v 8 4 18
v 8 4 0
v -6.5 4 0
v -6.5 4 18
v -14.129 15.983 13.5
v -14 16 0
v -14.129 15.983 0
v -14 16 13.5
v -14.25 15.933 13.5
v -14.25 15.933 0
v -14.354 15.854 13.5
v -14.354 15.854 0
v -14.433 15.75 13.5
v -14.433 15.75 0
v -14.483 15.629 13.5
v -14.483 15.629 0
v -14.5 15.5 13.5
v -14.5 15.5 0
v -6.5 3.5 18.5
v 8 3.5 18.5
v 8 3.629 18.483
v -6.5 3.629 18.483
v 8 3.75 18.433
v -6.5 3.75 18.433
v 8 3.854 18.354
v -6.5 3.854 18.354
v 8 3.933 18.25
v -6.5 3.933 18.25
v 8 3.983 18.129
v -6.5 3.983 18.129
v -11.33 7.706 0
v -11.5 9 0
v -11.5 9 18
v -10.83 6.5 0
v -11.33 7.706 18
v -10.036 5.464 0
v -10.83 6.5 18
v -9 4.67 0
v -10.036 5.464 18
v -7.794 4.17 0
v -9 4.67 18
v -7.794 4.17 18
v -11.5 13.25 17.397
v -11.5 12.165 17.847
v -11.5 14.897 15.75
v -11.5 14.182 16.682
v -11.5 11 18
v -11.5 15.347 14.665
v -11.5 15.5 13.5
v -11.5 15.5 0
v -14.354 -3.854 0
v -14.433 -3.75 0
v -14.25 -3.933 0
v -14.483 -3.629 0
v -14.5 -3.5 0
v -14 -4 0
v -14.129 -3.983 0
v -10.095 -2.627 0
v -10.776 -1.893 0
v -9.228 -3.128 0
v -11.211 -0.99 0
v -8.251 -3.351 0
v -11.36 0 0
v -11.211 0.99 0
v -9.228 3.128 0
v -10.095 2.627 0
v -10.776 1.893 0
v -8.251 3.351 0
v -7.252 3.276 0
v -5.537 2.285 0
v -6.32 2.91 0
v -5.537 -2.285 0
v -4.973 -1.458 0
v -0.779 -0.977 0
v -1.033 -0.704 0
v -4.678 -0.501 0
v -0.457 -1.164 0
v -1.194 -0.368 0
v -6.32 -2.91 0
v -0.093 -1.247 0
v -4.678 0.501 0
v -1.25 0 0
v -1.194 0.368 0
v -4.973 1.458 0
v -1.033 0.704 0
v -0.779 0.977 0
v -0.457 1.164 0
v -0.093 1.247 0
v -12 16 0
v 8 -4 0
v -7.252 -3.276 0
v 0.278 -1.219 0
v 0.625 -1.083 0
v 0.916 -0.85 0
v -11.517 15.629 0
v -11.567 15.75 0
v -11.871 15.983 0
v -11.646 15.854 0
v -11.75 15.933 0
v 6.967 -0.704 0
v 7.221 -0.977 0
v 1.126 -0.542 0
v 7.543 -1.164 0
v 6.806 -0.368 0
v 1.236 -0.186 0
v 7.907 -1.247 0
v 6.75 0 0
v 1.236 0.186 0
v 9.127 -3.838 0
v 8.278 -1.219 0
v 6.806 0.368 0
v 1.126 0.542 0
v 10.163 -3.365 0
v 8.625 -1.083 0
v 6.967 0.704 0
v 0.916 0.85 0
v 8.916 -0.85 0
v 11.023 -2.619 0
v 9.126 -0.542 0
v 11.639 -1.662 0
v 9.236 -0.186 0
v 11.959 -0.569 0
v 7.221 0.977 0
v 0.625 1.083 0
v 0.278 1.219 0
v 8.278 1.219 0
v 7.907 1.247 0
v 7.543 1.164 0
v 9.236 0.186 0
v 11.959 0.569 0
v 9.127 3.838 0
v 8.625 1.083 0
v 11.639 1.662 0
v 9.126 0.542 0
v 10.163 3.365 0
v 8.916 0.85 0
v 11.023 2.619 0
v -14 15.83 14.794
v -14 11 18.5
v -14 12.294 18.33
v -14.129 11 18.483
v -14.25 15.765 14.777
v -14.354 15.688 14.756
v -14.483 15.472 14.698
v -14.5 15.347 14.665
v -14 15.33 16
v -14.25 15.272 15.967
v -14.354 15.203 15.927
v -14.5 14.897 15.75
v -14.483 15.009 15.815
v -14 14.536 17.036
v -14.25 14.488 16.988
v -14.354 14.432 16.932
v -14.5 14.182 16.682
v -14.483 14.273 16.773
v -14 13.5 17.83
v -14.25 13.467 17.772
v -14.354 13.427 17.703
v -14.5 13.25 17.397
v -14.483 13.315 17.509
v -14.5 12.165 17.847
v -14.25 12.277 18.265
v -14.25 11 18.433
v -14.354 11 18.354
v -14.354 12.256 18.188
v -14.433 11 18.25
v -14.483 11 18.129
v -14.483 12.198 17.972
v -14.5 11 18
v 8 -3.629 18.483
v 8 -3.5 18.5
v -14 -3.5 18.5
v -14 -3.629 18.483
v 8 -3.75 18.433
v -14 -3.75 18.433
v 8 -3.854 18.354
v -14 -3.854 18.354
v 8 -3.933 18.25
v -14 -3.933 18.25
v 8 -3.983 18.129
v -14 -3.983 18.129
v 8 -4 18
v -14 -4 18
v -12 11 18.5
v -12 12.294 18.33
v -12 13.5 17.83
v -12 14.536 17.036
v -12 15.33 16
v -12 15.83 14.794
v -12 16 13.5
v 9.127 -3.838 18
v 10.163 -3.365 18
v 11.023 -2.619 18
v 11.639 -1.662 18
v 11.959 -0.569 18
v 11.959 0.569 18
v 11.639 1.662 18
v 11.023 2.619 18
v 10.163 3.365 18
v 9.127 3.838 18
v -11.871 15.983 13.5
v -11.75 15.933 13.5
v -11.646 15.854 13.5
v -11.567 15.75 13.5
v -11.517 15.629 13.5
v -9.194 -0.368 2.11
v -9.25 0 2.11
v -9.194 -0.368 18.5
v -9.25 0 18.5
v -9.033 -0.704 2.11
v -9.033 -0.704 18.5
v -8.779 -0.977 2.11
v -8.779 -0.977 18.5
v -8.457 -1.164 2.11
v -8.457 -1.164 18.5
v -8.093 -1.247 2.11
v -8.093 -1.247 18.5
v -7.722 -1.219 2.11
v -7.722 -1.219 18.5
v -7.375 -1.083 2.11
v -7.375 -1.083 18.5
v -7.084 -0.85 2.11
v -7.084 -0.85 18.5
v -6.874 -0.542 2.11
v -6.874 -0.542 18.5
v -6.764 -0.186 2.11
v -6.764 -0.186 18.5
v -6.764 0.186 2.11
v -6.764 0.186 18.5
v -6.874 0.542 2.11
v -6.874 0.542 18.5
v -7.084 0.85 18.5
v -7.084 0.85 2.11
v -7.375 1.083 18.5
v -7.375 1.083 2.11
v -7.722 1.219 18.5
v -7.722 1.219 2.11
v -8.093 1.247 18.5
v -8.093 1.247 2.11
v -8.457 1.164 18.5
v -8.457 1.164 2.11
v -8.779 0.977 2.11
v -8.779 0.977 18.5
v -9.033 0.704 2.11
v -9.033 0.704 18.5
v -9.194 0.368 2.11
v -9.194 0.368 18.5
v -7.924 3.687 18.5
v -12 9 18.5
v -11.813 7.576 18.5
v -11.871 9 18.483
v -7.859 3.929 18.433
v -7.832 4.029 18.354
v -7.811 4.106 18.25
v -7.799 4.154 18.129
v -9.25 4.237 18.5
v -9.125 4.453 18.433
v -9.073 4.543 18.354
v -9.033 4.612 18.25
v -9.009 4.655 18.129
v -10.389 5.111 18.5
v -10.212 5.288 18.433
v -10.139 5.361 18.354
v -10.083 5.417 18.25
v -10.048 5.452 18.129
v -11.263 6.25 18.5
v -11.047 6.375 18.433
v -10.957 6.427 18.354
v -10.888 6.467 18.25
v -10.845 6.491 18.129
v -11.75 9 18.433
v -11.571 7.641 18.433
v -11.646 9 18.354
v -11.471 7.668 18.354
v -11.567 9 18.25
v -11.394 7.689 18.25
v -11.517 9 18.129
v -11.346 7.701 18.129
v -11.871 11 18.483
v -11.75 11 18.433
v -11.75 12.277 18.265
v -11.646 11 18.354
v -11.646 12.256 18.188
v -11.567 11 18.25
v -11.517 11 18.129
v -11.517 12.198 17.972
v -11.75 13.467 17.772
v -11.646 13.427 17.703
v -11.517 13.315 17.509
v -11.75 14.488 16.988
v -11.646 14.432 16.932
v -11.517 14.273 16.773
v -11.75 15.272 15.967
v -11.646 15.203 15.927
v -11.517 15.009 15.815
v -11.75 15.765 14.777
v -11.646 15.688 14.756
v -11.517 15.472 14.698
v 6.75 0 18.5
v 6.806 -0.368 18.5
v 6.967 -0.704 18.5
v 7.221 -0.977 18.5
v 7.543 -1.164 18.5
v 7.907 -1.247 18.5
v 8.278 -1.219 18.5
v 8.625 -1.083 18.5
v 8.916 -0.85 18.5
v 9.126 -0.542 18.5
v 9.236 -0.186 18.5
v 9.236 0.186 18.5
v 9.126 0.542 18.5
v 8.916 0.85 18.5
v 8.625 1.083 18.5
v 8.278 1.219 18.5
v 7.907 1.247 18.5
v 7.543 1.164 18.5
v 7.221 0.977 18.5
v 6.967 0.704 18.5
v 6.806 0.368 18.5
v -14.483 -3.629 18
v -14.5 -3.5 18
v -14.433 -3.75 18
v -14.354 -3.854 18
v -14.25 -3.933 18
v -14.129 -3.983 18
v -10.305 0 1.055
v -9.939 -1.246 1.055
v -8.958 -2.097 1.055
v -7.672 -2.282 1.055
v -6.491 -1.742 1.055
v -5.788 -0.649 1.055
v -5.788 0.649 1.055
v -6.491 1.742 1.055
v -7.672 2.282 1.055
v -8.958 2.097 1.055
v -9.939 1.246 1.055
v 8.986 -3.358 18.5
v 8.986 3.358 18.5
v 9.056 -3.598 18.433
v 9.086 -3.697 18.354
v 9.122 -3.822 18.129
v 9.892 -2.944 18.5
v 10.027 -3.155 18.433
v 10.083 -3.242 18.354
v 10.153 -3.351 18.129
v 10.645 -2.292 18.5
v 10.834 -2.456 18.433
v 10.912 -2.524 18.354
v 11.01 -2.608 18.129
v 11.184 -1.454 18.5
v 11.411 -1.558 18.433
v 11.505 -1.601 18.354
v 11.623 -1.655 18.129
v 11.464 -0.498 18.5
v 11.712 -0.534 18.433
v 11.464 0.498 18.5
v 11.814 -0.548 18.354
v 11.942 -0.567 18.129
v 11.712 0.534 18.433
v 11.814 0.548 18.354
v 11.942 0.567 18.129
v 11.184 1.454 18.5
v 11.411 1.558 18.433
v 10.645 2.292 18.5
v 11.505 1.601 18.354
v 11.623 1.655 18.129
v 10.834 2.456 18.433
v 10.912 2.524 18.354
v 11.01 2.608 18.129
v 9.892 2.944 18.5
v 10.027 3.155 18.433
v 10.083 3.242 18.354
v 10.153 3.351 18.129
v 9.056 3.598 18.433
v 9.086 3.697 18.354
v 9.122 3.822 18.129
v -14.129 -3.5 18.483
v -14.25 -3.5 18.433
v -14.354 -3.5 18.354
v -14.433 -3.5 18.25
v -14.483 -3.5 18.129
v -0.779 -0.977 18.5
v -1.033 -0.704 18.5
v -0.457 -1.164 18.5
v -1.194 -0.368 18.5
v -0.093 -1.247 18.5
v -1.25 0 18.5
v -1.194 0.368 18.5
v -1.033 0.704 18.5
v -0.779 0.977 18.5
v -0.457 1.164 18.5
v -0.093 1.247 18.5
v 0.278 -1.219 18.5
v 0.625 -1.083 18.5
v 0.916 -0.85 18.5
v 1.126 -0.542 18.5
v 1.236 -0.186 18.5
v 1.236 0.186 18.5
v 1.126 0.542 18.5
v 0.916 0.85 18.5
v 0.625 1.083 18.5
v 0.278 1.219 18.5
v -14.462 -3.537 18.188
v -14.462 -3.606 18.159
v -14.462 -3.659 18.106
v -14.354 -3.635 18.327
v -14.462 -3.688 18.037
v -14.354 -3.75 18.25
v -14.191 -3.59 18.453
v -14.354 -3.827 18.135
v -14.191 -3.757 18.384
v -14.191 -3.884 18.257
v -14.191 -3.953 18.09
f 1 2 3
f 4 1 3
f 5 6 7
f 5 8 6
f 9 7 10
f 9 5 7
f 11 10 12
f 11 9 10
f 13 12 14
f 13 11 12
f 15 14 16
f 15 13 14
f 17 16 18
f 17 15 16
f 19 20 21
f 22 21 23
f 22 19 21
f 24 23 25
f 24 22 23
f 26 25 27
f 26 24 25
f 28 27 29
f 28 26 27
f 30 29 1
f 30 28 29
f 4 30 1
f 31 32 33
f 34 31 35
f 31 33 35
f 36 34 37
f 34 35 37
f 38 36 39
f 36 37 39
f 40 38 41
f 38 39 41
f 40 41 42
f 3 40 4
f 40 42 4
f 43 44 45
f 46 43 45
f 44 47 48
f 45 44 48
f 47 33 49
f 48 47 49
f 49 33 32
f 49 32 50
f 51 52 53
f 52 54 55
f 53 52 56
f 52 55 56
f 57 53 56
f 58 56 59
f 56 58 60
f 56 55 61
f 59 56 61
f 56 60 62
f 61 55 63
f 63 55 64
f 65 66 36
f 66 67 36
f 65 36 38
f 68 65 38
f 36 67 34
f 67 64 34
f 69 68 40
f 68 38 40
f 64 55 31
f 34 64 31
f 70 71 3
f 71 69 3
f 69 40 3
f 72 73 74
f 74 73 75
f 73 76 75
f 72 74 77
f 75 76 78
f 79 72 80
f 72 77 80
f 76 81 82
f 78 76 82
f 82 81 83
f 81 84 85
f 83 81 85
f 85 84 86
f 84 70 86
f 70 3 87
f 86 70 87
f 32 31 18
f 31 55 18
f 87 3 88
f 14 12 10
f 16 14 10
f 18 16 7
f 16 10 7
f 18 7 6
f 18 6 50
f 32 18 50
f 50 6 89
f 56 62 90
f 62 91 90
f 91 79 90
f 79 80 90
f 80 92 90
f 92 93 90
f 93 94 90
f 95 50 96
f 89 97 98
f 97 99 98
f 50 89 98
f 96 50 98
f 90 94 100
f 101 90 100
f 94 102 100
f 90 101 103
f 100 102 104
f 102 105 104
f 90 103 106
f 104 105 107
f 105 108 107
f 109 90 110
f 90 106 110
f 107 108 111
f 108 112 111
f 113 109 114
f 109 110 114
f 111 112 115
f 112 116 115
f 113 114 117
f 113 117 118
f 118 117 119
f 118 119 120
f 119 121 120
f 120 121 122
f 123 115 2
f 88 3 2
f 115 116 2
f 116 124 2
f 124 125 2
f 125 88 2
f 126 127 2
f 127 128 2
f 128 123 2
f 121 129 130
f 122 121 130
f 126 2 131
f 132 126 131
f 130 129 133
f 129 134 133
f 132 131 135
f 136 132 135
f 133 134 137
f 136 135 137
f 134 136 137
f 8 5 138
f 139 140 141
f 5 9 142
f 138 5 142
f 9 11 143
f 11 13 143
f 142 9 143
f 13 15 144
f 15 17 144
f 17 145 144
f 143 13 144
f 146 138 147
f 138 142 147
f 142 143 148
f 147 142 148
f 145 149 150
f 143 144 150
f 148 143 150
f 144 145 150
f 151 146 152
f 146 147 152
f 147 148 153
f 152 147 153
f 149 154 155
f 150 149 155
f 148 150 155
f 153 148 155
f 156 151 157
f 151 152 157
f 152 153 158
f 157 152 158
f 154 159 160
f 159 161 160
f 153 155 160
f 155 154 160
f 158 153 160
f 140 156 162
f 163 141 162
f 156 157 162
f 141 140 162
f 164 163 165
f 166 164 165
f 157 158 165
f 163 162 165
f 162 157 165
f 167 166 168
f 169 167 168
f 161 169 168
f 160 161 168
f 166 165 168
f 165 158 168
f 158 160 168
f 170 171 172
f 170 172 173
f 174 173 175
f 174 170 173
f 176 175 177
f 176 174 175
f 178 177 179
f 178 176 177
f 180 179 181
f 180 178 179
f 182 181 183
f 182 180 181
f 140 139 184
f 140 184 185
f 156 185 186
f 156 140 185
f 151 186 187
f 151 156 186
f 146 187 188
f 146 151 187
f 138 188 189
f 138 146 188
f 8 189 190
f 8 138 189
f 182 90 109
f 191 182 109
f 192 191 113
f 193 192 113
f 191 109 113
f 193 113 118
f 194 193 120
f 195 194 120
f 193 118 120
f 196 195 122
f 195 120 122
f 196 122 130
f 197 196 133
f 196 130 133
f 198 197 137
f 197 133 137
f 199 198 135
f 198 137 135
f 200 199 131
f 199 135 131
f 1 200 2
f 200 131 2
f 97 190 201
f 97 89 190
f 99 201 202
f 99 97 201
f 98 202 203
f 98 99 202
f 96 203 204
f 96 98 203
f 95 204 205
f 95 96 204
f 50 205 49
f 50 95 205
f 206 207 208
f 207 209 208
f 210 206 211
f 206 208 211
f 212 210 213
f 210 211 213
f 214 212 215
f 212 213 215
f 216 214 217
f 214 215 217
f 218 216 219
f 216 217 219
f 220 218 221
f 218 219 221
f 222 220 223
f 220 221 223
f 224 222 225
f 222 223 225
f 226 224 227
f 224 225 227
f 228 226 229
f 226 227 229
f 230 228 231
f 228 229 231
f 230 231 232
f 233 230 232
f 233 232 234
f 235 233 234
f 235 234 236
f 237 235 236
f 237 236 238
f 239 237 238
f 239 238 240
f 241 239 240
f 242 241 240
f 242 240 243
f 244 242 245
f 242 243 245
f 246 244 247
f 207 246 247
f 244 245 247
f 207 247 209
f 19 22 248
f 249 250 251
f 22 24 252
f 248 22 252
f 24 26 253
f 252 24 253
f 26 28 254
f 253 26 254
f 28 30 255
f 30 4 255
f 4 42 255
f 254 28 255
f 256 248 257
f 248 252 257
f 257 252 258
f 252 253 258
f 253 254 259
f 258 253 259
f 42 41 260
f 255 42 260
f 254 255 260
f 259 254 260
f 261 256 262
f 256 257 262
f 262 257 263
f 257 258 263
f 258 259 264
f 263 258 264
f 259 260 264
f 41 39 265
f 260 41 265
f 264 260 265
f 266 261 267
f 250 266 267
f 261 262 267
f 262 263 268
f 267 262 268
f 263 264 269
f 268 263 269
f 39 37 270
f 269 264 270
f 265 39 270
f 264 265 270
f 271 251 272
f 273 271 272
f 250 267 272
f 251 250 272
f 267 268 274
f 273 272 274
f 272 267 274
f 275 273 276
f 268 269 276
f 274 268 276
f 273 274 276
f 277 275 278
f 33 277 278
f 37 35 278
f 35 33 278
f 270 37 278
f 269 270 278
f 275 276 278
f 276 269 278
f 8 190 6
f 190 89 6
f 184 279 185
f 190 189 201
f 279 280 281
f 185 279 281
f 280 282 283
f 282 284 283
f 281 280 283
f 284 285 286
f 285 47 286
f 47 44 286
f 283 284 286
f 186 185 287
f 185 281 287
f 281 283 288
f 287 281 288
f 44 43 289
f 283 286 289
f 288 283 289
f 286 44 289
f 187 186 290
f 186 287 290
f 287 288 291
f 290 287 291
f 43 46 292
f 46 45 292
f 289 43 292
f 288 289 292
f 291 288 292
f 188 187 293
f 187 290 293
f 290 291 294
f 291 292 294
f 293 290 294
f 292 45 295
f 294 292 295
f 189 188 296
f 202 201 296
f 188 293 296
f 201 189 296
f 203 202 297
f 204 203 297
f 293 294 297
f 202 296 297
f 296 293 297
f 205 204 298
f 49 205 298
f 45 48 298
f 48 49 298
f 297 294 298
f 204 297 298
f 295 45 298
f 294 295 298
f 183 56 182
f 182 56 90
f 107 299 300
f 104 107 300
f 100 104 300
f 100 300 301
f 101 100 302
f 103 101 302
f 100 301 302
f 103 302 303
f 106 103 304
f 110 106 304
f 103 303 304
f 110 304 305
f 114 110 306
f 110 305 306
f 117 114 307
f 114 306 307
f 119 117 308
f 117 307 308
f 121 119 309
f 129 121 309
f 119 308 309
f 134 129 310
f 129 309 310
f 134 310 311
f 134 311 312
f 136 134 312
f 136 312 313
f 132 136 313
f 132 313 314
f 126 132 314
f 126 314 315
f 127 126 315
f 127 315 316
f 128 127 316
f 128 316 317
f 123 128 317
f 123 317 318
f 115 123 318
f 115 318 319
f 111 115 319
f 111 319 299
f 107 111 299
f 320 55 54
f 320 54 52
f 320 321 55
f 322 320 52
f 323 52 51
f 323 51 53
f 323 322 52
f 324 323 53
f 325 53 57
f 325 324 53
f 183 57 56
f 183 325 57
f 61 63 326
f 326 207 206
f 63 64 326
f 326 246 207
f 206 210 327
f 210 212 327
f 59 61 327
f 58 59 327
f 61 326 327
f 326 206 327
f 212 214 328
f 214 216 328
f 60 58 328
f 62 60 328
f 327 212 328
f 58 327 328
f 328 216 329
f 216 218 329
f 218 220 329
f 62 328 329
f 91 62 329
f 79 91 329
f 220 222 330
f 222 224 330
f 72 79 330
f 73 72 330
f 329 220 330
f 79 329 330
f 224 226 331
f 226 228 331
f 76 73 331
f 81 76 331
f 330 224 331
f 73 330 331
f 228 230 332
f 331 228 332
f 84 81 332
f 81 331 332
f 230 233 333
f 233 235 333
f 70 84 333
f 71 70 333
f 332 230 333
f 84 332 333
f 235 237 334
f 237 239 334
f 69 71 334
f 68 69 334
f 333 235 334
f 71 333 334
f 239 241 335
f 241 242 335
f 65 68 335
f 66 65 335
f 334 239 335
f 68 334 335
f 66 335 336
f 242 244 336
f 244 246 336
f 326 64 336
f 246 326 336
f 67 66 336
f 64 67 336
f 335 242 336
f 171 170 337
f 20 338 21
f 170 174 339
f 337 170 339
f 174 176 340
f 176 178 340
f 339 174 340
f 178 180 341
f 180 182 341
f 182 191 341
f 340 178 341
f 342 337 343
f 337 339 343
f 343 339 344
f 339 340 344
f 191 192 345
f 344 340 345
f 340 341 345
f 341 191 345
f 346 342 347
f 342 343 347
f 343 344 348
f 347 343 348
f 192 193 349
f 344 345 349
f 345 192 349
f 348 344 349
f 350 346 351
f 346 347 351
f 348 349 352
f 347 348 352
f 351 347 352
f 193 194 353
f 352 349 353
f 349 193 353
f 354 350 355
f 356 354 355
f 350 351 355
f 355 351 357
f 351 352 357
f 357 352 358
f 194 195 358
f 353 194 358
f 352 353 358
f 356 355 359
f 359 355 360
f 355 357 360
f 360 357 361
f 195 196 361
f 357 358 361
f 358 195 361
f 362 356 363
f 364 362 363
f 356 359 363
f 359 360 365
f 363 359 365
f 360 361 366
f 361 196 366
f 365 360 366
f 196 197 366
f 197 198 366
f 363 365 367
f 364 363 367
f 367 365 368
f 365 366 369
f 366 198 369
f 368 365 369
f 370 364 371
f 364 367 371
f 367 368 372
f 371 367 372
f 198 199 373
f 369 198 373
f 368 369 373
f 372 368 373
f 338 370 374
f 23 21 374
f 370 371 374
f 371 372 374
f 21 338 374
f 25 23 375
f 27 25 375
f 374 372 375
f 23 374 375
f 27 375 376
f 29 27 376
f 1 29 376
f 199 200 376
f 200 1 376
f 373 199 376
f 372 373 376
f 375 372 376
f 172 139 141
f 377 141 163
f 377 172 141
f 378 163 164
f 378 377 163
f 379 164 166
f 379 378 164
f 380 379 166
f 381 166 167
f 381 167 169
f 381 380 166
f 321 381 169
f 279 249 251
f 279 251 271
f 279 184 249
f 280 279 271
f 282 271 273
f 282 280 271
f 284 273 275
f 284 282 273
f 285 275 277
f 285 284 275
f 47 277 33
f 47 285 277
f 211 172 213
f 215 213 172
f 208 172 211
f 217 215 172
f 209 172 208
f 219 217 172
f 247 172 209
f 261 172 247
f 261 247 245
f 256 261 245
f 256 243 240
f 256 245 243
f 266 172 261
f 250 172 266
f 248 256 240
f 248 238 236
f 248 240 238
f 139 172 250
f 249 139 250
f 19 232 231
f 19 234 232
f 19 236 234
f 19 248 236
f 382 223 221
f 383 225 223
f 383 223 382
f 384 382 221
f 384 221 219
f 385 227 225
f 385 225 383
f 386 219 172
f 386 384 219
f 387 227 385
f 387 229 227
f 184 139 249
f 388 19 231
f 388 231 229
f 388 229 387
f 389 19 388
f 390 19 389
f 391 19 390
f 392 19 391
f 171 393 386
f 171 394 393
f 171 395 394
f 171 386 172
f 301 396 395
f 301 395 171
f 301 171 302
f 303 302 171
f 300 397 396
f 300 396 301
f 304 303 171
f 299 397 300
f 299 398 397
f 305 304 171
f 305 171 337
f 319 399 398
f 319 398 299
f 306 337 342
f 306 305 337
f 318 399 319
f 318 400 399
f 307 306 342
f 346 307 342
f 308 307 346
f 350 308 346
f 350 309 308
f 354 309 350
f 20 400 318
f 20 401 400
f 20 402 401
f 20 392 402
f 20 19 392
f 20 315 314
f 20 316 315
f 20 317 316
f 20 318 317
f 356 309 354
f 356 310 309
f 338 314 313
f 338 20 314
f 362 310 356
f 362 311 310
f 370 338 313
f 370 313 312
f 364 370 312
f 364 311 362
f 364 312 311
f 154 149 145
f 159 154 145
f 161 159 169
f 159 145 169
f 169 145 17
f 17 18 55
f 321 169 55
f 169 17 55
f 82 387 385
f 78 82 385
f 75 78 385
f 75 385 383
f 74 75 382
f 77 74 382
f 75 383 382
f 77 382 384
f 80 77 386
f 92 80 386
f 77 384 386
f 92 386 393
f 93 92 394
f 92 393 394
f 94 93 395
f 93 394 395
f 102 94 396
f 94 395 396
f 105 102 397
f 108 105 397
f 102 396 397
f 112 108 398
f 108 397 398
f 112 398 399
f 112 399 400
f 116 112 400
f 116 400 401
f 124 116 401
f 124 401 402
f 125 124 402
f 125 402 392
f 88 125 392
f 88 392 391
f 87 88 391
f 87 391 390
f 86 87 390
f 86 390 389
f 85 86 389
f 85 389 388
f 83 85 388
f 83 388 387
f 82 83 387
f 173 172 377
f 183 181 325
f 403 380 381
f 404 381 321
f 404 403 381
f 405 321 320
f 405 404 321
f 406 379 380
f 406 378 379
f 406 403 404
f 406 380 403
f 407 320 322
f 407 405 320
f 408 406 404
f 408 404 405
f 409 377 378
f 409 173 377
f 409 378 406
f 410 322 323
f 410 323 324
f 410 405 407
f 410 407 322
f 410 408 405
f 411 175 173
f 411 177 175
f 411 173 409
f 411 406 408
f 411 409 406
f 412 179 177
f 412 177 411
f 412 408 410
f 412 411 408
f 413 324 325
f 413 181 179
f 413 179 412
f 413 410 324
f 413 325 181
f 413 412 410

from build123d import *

# Parameters (mm, degrees)
F0_R           = 1.5
F1_DEPTH       = 18.5
F2_D           = 2.5
F3_D           = 2.5
F3_CSINK_D     = 6.72
F3_CSINK_ANGLE = 90
F4_R           = 5
F5_R           = 0.5


with BuildPart() as f1:
    # F0 (on Top) → F1 (new body)
    with BuildSketch(Plane.XY):
        with BuildLine():
            Line((-14.5, -4), (8, -4))
            ThreePointArc((8, -4), (12, 0), (8, 4))
            Line((8, 4), (-11.5, 4))
            Line((-11.5, 4), (-11.5, 16))
            Line((-11.5, 16), (-14.5, 16))
            Line((-14.5, 16), (-14.5, -4))
        make_face()
        with Locations((-8, 0)):
            Circle(F0_R, mode=Mode.SUBTRACT)
        Circle(F0_R, mode=Mode.SUBTRACT)
        with Locations((8, 0)):
            Circle(F0_R, mode=Mode.SUBTRACT)
        Circle(F0_R)
        with Locations((8, 0)):
            Circle(F0_R)
        with Locations((-8, 0)):
            Circle(F0_R)
    extrude(amount=F1_DEPTH)

    # F2 (through all)
    with Locations(Plane(origin=(0, 0, 0), x_dir=(1, 0, 0), z_dir=(0, 0, -1))):
        with Locations((8, 0), (0, 0)):
            Hole(F2_D / 2)

    # F3 (through all)
    with Locations(Plane(origin=(0, 0, 0), x_dir=(1, 0, 0), z_dir=(0, 0, -1))):
        with Locations((-8, 0)):
            CounterSinkHole(F3_D / 2, F3_CSINK_D / 2, counter_sink_angle=F3_CSINK_ANGLE)

    # F4
    f4_edges = [f1.edges().sort_by_distance(p)[0] for p in [
        (-11.5, 4, 9.25),
        (-13, 16, 18.5),
    ]]
    fillet(f4_edges, radius=F4_R)

    # F5
    f5_edges = [f1.edges().sort_by_distance(p)[0] for p in [
        (-3.25, -4, 18.5),
        (-14.5, 3.5, 18.5),
        (-14.5, 14.535534, 17.035534),
        (-14.5, -4, 9.25),
    ]]
    fillet(f5_edges, radius=F5_R)


solid = f1.part
